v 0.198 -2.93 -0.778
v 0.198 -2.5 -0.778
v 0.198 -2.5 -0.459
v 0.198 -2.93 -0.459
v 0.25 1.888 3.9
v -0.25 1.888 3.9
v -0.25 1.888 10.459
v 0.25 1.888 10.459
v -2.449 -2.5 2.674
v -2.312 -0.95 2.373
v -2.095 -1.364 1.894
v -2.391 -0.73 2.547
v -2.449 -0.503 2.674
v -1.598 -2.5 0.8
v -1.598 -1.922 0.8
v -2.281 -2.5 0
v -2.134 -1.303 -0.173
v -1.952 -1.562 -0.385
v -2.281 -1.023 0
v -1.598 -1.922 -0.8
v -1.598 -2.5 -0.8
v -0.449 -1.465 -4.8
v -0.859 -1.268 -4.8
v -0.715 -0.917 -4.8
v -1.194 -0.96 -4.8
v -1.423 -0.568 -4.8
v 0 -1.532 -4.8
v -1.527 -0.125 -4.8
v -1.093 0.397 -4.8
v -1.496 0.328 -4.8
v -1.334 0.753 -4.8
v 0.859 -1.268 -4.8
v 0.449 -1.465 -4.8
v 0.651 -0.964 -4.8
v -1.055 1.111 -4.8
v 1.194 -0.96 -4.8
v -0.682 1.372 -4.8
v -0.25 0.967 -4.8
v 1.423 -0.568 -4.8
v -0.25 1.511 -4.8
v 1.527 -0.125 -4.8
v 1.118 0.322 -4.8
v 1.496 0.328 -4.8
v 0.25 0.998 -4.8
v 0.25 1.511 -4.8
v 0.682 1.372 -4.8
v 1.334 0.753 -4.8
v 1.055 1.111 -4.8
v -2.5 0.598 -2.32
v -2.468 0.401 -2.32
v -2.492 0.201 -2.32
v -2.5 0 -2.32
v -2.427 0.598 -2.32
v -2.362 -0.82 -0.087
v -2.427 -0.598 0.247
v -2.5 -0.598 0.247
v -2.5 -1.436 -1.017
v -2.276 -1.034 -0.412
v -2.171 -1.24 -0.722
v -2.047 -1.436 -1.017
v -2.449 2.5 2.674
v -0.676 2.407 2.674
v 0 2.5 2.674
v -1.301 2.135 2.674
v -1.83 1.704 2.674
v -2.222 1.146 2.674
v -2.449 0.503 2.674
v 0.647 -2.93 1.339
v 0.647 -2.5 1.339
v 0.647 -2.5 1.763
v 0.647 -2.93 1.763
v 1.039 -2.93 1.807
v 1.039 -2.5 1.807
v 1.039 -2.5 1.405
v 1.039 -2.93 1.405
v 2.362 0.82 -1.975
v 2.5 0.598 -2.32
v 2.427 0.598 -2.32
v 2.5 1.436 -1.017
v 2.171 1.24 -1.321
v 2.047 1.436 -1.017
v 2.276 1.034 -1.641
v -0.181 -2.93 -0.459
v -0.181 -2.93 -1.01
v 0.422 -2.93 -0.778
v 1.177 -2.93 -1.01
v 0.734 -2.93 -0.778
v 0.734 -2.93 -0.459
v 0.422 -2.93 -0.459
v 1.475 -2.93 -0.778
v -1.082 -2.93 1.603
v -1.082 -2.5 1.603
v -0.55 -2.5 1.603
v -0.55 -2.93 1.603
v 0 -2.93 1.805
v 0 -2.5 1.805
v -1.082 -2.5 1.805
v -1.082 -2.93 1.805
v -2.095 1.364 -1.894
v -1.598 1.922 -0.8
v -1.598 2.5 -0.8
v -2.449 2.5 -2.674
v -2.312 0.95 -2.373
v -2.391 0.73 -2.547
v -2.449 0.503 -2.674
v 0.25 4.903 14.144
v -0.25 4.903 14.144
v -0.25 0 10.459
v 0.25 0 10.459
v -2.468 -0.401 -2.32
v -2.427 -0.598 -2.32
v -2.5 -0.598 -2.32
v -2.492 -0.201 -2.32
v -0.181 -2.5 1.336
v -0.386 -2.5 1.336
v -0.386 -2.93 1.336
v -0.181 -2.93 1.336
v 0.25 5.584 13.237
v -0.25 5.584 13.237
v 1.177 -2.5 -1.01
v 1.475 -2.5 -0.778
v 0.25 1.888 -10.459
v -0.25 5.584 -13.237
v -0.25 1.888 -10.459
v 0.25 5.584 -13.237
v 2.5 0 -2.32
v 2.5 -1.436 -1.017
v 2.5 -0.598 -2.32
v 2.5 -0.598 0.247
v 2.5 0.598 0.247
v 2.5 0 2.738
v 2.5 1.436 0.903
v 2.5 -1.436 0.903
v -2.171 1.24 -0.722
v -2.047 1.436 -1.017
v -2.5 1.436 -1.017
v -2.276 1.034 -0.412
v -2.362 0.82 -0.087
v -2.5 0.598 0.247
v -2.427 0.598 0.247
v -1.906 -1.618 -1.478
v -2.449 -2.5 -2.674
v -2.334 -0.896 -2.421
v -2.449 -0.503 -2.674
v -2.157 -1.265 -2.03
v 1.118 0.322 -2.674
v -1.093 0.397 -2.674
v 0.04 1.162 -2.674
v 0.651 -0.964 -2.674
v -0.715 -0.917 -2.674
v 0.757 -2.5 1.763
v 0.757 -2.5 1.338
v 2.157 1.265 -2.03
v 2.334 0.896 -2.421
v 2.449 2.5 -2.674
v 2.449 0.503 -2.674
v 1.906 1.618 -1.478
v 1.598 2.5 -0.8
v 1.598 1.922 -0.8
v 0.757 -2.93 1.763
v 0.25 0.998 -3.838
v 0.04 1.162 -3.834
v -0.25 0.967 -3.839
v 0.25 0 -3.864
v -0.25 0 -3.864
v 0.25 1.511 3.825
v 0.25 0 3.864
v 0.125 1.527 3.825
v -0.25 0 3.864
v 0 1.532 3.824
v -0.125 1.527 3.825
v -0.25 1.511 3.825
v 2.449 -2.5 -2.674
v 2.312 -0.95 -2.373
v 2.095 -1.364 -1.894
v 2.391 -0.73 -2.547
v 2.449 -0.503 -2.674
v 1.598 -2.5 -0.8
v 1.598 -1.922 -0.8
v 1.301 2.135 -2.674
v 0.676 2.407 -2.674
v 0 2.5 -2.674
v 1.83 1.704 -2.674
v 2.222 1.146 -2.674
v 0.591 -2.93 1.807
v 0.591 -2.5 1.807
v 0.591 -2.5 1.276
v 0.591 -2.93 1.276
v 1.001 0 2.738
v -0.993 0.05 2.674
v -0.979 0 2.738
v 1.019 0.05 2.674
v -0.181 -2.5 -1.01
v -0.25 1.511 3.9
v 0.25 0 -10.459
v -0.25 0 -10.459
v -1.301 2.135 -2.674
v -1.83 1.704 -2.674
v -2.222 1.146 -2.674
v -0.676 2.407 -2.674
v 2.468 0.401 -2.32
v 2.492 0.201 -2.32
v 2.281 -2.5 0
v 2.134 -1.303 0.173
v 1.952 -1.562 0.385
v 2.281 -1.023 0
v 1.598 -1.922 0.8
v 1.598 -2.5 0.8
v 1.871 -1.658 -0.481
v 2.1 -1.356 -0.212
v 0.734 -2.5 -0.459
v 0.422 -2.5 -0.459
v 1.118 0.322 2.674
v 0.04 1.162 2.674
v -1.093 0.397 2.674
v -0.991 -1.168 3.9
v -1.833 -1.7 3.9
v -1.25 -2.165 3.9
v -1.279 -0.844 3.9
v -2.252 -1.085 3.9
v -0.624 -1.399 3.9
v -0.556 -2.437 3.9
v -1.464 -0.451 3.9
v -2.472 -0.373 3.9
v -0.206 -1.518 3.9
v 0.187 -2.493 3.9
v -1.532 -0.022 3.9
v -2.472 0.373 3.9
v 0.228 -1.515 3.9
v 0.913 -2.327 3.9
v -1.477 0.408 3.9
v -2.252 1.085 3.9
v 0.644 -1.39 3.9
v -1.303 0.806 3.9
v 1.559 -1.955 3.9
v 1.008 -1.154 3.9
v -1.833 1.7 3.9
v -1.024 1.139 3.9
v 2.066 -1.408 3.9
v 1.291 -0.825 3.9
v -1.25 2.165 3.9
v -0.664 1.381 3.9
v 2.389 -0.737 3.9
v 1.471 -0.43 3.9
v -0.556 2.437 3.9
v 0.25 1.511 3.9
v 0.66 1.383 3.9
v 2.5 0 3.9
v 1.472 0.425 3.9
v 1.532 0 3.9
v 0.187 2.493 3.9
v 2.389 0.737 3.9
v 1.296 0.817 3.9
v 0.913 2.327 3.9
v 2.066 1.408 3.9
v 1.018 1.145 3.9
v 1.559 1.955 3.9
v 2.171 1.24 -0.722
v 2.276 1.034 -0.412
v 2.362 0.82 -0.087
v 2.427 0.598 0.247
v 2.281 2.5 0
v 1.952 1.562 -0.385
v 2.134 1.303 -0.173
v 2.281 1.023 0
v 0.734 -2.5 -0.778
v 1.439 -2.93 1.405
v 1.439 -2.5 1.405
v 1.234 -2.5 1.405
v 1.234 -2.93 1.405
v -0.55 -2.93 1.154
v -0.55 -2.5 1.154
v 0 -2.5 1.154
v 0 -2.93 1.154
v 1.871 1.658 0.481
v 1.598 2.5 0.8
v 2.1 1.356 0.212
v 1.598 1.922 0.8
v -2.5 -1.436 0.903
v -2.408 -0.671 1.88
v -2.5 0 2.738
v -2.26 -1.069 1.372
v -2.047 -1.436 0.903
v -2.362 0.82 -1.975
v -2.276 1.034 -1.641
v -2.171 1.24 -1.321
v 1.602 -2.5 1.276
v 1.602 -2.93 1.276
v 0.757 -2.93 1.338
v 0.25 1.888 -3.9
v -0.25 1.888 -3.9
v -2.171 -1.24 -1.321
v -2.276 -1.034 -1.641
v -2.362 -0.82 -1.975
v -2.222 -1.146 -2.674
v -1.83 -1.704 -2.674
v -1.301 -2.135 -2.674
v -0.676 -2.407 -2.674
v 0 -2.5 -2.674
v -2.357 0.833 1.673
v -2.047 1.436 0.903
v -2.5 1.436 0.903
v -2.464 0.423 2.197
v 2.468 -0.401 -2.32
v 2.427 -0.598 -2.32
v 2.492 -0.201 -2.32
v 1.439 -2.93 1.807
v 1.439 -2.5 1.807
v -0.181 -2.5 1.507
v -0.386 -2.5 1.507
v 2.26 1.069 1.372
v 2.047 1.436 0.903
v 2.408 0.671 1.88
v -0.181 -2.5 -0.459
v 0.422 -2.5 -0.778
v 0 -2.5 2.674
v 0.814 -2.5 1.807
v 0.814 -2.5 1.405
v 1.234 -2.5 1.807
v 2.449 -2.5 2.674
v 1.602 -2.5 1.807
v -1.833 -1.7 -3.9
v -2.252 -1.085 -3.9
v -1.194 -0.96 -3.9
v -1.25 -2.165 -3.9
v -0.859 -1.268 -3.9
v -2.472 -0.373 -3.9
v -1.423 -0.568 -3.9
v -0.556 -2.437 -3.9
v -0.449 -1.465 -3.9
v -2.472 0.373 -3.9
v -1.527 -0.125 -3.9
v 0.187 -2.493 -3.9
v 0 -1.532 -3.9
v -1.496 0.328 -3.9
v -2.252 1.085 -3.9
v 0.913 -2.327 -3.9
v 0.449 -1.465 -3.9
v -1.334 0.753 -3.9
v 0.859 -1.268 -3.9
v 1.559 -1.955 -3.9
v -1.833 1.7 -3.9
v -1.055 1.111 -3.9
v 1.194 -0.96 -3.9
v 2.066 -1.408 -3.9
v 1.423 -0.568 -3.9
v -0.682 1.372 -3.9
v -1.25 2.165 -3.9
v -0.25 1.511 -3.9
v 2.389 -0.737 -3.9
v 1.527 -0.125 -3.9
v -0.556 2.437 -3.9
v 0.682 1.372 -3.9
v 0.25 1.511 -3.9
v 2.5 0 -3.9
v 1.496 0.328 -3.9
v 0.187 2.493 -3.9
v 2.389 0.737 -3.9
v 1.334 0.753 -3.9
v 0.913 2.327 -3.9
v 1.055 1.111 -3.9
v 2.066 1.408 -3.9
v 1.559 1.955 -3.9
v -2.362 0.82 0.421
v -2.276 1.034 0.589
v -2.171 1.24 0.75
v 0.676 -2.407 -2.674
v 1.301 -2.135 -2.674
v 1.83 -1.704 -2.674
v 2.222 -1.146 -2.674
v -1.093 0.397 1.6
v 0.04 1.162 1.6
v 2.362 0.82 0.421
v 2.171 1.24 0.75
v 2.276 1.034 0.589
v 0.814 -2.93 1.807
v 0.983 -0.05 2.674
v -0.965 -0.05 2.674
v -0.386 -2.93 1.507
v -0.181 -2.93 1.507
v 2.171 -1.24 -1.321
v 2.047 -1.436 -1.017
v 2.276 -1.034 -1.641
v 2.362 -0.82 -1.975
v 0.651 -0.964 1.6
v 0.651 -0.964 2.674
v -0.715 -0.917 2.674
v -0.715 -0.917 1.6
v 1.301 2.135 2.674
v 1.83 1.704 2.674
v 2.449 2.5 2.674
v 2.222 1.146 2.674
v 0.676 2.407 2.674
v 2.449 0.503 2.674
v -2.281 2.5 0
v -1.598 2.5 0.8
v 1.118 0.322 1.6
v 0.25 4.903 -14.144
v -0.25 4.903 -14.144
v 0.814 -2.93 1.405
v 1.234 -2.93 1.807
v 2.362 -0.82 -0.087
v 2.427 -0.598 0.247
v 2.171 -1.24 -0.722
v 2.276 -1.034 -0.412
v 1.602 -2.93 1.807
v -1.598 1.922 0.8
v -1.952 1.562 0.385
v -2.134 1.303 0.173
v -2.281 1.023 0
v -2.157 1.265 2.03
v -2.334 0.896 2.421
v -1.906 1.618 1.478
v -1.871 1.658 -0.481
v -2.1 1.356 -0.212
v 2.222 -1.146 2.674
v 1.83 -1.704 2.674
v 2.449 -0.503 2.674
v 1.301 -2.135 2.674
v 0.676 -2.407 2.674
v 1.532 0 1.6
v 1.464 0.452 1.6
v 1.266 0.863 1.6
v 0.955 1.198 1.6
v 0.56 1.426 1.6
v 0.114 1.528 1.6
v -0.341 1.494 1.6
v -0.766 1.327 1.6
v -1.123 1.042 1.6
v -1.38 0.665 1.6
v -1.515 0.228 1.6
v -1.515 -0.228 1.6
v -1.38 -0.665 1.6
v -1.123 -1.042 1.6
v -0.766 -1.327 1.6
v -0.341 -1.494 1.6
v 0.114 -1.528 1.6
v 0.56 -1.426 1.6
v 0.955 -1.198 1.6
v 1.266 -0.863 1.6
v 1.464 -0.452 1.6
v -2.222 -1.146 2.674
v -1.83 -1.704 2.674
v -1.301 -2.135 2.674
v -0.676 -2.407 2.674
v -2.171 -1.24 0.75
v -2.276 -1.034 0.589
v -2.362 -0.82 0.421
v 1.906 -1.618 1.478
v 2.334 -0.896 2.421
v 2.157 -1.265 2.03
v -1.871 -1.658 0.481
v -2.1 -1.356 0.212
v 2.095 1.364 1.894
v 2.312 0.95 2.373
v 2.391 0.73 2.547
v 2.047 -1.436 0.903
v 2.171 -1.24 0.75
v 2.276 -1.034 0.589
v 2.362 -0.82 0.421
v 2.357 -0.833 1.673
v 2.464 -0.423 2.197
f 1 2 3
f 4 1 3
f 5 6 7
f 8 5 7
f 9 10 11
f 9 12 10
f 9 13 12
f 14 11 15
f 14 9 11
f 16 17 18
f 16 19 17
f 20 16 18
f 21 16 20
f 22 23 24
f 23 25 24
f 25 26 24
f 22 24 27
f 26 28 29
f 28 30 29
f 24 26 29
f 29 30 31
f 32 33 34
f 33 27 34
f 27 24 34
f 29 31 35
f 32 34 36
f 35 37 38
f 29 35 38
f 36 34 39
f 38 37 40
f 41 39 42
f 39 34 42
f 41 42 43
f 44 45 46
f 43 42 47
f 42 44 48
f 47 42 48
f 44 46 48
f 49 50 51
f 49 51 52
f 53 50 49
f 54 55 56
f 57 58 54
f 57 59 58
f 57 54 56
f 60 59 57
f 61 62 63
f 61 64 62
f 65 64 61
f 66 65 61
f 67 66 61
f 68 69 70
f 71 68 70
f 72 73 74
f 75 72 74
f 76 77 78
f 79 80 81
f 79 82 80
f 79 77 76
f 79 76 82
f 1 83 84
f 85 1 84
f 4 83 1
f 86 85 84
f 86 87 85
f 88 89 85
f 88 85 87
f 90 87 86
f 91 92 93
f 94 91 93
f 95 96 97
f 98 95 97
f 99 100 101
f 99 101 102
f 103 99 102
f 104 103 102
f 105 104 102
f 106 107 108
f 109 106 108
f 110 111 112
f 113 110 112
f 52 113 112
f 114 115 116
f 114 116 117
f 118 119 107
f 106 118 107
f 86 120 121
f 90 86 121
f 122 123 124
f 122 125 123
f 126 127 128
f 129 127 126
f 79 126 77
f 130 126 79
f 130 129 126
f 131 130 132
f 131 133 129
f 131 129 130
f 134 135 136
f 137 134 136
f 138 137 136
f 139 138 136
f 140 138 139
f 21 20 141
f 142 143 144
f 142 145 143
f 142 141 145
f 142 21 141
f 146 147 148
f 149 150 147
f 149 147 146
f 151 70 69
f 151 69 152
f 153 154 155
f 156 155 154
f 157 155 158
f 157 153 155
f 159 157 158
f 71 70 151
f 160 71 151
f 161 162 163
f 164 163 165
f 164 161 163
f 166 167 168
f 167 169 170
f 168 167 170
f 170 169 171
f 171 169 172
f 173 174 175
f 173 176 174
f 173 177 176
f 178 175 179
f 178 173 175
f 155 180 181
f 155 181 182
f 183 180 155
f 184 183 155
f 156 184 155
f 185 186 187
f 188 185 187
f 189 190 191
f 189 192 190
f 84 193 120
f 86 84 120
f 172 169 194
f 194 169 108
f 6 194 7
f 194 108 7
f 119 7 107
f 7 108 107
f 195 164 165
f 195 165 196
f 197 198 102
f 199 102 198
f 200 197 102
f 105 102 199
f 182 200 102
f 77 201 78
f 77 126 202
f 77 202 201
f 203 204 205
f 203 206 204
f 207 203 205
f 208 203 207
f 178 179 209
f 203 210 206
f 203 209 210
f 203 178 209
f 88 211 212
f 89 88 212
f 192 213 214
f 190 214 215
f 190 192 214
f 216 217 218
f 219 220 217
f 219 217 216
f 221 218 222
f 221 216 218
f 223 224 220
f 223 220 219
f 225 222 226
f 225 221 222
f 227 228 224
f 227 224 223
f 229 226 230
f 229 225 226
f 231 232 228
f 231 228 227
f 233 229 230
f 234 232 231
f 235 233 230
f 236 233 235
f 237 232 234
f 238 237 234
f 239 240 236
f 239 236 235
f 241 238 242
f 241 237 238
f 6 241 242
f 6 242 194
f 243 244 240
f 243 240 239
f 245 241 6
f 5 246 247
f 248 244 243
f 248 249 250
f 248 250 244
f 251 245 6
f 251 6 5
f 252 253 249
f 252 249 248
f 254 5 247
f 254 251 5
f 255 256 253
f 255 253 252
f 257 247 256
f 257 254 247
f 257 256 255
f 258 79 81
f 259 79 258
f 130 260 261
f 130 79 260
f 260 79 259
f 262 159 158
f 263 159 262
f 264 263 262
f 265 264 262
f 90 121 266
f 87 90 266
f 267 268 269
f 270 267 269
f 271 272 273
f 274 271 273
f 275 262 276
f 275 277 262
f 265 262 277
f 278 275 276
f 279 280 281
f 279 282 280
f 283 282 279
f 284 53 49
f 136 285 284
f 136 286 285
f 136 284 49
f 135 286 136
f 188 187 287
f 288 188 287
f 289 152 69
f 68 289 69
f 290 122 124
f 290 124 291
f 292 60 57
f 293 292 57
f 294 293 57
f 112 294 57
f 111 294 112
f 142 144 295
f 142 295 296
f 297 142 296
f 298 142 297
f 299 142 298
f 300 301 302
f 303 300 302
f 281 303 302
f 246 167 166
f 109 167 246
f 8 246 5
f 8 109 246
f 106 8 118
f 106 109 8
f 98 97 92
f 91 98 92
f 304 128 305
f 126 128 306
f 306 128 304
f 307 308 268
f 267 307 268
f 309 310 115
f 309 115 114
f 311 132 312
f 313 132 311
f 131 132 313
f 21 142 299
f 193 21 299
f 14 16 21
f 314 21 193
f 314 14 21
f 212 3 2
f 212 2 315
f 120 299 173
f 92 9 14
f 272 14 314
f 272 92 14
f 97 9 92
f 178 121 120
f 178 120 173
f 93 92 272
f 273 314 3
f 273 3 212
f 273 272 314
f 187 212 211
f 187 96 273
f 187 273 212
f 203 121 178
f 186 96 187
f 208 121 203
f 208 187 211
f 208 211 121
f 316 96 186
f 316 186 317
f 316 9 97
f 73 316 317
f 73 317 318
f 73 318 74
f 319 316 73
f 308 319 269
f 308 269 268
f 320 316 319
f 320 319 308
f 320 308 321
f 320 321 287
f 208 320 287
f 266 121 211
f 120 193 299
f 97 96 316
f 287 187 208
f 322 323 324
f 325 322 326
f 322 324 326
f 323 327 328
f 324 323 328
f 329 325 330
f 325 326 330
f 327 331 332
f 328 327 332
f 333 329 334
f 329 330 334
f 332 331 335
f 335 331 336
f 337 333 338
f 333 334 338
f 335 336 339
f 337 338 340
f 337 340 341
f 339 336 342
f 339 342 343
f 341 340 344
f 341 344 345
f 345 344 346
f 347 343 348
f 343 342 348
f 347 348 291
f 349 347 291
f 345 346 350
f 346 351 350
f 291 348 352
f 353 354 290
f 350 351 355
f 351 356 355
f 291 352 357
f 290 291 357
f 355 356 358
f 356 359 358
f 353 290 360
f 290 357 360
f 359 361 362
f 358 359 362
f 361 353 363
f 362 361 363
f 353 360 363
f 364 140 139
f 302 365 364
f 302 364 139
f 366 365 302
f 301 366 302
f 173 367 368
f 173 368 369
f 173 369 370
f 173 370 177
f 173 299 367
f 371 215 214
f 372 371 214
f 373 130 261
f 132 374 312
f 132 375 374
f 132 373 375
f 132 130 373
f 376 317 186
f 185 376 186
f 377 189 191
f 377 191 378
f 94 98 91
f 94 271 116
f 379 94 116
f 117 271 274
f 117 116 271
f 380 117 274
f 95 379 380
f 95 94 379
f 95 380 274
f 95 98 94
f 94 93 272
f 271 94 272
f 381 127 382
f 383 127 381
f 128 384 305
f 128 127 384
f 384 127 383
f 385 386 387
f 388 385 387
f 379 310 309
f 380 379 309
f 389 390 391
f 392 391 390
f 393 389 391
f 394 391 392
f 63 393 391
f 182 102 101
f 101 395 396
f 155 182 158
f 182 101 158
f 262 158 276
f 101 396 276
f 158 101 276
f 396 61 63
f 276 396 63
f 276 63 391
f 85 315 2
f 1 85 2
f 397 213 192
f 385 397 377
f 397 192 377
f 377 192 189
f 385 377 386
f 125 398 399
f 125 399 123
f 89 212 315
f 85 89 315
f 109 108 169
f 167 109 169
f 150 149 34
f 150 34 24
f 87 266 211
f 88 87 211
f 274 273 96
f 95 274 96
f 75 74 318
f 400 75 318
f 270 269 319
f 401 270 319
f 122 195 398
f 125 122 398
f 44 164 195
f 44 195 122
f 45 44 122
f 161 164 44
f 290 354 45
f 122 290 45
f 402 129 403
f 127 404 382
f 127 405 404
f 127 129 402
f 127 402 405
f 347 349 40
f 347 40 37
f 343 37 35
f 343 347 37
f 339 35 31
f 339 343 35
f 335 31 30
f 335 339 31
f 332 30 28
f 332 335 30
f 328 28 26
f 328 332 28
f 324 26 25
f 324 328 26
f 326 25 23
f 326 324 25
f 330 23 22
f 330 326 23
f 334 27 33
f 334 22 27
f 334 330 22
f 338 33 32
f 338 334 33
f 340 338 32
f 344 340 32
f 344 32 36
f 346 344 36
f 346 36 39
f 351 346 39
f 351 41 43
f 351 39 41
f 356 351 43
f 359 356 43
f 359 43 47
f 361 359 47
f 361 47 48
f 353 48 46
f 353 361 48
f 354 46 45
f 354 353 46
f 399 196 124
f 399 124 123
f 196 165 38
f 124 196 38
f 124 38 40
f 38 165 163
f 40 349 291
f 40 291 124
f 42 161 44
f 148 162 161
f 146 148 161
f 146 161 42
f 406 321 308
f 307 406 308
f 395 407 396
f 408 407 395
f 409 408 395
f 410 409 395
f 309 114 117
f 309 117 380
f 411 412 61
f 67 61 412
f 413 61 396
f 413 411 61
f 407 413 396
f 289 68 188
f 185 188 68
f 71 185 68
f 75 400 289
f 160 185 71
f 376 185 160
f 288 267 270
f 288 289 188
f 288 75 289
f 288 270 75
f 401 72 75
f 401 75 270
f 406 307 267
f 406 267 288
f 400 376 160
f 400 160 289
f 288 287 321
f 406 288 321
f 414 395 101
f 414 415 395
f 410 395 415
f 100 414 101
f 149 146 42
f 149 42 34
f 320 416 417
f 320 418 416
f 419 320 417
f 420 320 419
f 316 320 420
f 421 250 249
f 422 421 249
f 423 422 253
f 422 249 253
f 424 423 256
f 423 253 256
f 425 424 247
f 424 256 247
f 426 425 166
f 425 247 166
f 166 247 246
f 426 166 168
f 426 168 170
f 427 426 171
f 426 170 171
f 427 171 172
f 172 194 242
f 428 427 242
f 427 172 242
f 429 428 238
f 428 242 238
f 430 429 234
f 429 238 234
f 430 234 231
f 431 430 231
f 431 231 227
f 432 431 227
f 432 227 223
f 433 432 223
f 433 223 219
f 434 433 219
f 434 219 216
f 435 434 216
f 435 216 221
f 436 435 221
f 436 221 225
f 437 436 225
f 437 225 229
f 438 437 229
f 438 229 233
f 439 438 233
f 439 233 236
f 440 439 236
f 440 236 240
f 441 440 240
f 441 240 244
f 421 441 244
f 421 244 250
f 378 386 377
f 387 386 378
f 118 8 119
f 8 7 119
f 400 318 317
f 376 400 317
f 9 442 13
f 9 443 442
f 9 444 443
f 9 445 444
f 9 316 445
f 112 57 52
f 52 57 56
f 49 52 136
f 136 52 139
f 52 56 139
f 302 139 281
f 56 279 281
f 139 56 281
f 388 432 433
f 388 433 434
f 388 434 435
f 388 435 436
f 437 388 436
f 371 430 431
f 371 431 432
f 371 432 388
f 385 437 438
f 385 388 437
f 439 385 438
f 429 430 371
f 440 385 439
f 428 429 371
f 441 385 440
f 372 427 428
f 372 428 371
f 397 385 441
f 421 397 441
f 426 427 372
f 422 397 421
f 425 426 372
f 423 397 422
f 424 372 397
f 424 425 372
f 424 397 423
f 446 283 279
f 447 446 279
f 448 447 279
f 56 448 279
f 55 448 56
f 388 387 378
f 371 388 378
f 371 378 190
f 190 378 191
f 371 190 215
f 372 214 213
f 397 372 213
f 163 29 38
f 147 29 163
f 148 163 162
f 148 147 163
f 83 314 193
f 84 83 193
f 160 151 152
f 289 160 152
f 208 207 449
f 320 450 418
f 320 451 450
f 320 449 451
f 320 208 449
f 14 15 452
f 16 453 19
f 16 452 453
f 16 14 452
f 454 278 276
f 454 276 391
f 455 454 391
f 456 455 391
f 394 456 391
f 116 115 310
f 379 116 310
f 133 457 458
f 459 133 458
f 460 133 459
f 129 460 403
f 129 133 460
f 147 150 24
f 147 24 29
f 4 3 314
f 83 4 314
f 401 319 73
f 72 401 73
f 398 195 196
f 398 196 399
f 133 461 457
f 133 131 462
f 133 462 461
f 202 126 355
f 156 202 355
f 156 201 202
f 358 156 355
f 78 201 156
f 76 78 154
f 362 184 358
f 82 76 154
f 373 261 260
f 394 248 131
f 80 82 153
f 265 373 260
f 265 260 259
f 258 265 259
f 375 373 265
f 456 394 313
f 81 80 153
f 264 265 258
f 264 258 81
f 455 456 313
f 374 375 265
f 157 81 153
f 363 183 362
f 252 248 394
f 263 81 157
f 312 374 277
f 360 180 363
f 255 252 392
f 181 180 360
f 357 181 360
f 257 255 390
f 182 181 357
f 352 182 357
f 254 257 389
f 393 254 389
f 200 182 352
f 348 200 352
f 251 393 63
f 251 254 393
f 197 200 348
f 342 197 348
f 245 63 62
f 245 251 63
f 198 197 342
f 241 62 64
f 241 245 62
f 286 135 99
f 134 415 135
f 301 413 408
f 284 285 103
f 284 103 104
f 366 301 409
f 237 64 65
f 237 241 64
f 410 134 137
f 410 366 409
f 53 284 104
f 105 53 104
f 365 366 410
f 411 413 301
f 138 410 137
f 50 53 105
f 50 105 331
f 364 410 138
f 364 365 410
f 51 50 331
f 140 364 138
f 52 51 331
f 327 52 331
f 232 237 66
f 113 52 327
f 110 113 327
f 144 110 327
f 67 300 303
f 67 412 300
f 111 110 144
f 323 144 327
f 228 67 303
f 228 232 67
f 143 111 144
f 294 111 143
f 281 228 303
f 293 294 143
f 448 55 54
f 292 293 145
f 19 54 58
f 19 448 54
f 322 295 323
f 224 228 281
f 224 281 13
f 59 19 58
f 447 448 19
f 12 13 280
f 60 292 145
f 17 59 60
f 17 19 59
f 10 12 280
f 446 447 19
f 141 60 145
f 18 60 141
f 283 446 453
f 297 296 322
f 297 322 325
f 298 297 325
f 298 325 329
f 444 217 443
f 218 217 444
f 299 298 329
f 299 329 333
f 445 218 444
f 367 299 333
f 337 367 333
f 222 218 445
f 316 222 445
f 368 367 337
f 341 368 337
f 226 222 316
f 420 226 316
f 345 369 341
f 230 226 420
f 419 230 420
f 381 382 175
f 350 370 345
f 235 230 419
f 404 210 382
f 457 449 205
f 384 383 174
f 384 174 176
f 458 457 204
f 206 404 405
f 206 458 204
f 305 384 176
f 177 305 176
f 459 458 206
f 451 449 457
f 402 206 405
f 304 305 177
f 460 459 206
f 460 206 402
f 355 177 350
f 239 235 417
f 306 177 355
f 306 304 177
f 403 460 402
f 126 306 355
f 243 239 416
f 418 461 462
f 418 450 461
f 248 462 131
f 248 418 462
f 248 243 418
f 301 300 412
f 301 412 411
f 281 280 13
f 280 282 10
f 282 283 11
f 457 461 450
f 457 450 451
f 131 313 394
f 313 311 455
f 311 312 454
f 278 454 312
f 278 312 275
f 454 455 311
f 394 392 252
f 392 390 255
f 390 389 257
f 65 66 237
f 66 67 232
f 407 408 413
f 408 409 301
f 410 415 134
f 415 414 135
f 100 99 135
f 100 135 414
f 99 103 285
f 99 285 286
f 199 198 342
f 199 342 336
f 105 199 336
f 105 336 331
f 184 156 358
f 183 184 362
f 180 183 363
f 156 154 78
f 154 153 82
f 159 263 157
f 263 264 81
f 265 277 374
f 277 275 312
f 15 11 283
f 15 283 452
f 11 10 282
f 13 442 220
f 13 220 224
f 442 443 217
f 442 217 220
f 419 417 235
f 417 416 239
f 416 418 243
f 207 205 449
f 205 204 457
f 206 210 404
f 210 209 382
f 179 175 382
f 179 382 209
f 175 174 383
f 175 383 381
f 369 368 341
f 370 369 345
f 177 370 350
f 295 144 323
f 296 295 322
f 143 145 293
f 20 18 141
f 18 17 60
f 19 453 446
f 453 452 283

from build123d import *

# Parameters (mm, degrees)
F0_R      = 1.5320214601
F1_DEPTH  = 4.8
F0_R_2    = 2.5
F2_DEPTH  = 3.9
F4_DEPTH  = 2.5
F6_DEPTH  = 2.5
F7_DEPTH  = 3.2
F8_W      = 0.2057314705
F8_H      = 0.1714428654
F9_DEPTH  = 0.4
F11_DEPTH = 0.25
F12_DEPTH = 0.43


with BuildPart() as f1:
    # F0 (on Top) → F1 (new body, symmetric)
    with BuildSketch(Plane.XY):
        Circle(F0_R)
        Polygon((0.039557572, 1.1622756139), (1.1176137583, 0.3215414302), (0.6511657169, -0.9635520812), (-0.715171213, -0.9170493663), (-1.0931658343, 0.3967844035), align=None, mode=Mode.SUBTRACT)
    extrude(amount=F1_DEPTH, both=True)

    # F0 (on Top) → F2 (join, symmetric)
    with BuildSketch(Plane.XY):
        Circle(F0_R_2)
        Circle(F0_R, mode=Mode.SUBTRACT)
    extrude(amount=F2_DEPTH, both=True)

    # F3 (on Front) → F4 (join, symmetric)
    with BuildSketch(Plane.XZ):
        Polygon((2.4489383213, 2.6739891618), (0, 2.6739891618), (1.5983604826, 0.8004051051), align=None)
        Polygon((-1.5983604826, 0.8004051051), (0, 2.6739891618), (-2.4489383213, 2.6739891618), align=None)
        Polygon((0, 0), (0, 2.6739891618), (-1.5983604826, 0.8004051051), (-1.5983604826, 0), align=None)
        Polygon((1.5983604826, 0.8004051051), (0, 2.6739891618), (0, 0), (1.5983604826, 0), align=None)
        Polygon((2.2811886085, 0), (1.5983604826, 0.8004051051), (1.5983604826, 0), (1.5983604826, -0.8004051051), align=None)
        Polygon((-1.5983604826, 0), (-1.5983604826, 0.8004051051), (-2.2811886085, 0), (-1.5983604826, -0.8004051051), align=None)
        Polygon((0, -2.6739891618), (0, 0), (-1.5983604826, 0), (-1.5983604826, -0.8004051051), align=None)
        Polygon((1.5983604826, 0), (0, 0), (0, -2.6739891618), (1.5983604826, -0.8004051051), align=None)
        Polygon((1.5983604826, -0.8004051051), (0, -2.6739891618), (2.4489383213, -2.6739891618), align=None)
        Polygon((-2.4489383213, -2.6739891618), (0, -2.6739891618), (-1.5983604826, -0.8004051051), align=None)
    extrude(amount=F4_DEPTH, both=True)

    # F5 (on Right) → F6 (join, symmetric)
    with BuildSketch(Plane.YZ):
        Polygon((1.4358381741, 0.9031511727), (0, 2.7375903446), (-1.4358381741, 0.9031511727), (-0.5977854705, 0.2471969813), (-1.4358381741, -1.0170094902), (-0.5977854705, -2.3199757561), (0.5977854705, -2.3199757561), (1.4358381741, -1.0170094902), (0.5977854705, 0.2471969813), align=None)
    extrude(amount=F6_DEPTH, both=True)

    # F7 (cut): a face of the model
    f7_faces = [f1.faces().sort_by_distance(p)[0] for p in [
        (-1.4886893496, 0, 4.8),
    ]]
    extrude(f7_faces, amount=-F7_DEPTH, mode=Mode.SUBTRACT)

    # F8 (on face) → F9 (join)
    with BuildSketch(Plane.XZ.offset(2.5)):
        Polygon((-0.181210431, -0.4586814321), (-0.181210431, -1.0104251851), (1.1774745134, -1.0104251851), (1.4746332308, -0.7784541231), (1.1832588352, -0.7784541231), (0.7335068658, -0.7784541231), (0.7335068658, -0.4586814321), (0.4220934934, -0.4586814321), (0.4220934934, -0.7784541231), (0.1979402587, -0.7784541231), (0.1979402587, -0.4586814321), align=None)
        Polygon((0, 1.6032253625), (0, 1.8050573999), (-1.0815345449, 1.8050573999), (-1.0815345449, 1.6032253625), (-0.5499689287, 1.6032253625), (-0.5499689287, 1.1543665896), (0, 1.1543665896), align=None)
        with Locations((-0.2835566193, 1.4216544223)):
            Rectangle(F8_W, F8_H, mode=Mode.SUBTRACT)
        Polygon((0.5908022868, 1.8074008403), (0.5908022868, 1.2759278761), (1.2337132357, 1.2759278761), (1.6023155767, 1.2759278761), (1.6023155767, 1.7541147536), (1.5667511437, 1.7541147536), (1.529708039, 1.7541147536), (1.529708039, 1.3383656042), (1.1996804969, 1.3380937204), (1.0839564493, 1.3379983845), (1.0839564493, 1.8074008403), (1.0386969661, 1.8074008403), (1.0386969661, 1.4045101125), (0.8136780816, 1.4045101125), (0.8136780816, 1.8074008403), align=None)
        Polygon((0.7572061731, 1.7627113266), (0.7572061731, 1.3381995394), (0.6472741952, 1.3391206739), (0.6472741952, 1.7627113266), align=None, mode=Mode.SUBTRACT)
        Polygon((1.5667511437, 1.7541147536), (1.6023155767, 1.7541147536), (1.6023155767, 1.8074008403), (1.4394447207, 1.8074008403), (1.4394447207, 1.7541147536), (1.529708039, 1.7541147536), align=None)
        Polygon((1.529708039, 1.3383656042), (1.529708039, 1.7541147536), (1.4394447207, 1.7541147536), (1.4394447207, 1.4045101125), (1.2337132357, 1.4045101125), (1.2337132357, 1.8074008403), (1.1996804969, 1.8074008403), (1.1996804969, 1.3380937204), align=None)
        Polygon((1.1996804969, 1.8074008403), (1.0839564493, 1.8074008403), (1.0839564493, 1.3379983845), (1.1996804969, 1.3380937204), align=None)
    extrude(amount=F9_DEPTH)

    # F10 (on Right) → F11 (join, symmetric)
    with BuildSketch(Plane.YZ):
        Polygon((0, 10.4586472735), (0, 3.8638201077), (1.8880540525, 3.8153284695), (1.8880540525, 10.4586472735), (5.5842293836, 13.2371469554), (4.9025323242, 14.1439931467), align=None)
        Polygon((1.8880540525, -3.8153284695), (0, -3.8638201077), (0, -10.4586472735), (4.9025323242, -14.1439931467), (5.5842293836, -13.2371469554), (1.8880540525, -10.4586472735), align=None)
    extrude(amount=F11_DEPTH, both=True)

    # F8 (on face) → F12 (join)
    with BuildSketch(Plane.XZ.offset(2.5)):
        Polygon((-0.181210431, -0.4586814321), (-0.181210431, -1.0104251851), (1.1774745134, -1.0104251851), (1.4746332308, -0.7784541231), (1.1832588352, -0.7784541231), (0.7335068658, -0.7784541231), (0.7335068658, -0.4586814321), (0.4220934934, -0.4586814321), (0.4220934934, -0.7784541231), (0.1979402587, -0.7784541231), (0.1979402587, -0.4586814321), align=None)
        Polygon((0, 1.6032253625), (0, 1.8050573999), (-1.0815345449, 1.8050573999), (-1.0815345449, 1.6032253625), (-0.5499689287, 1.6032253625), (-0.5499689287, 1.1543665896), (0, 1.1543665896), align=None)
        with Locations((-0.2835566193, 1.4216544223)):
            Rectangle(F8_W, F8_H, mode=Mode.SUBTRACT)
        Polygon((0.5908022868, 1.8074008403), (0.5908022868, 1.2759278761), (1.2337132357, 1.2759278761), (1.6023155767, 1.2759278761), (1.6023155767, 1.7541147536), (1.5667511437, 1.7541147536), (1.529708039, 1.7541147536), (1.529708039, 1.3383656042), (1.1996804969, 1.3380937204), (1.0839564493, 1.3379983845), (1.0839564493, 1.8074008403), (1.0386969661, 1.8074008403), (1.0386969661, 1.4045101125), (0.8136780816, 1.4045101125), (0.8136780816, 1.8074008403), align=None)
        Polygon((0.7572061731, 1.7627113266), (0.7572061731, 1.3381995394), (0.6472741952, 1.3391206739), (0.6472741952, 1.7627113266), align=None, mode=Mode.SUBTRACT)
        Polygon((1.5667511437, 1.7541147536), (1.6023155767, 1.7541147536), (1.6023155767, 1.8074008403), (1.4394447207, 1.8074008403), (1.4394447207, 1.7541147536), (1.529708039, 1.7541147536), align=None)
        Polygon((1.529708039, 1.3383656042), (1.529708039, 1.7541147536), (1.4394447207, 1.7541147536), (1.4394447207, 1.4045101125), (1.2337132357, 1.4045101125), (1.2337132357, 1.8074008403), (1.1996804969, 1.8074008403), (1.1996804969, 1.3380937204), align=None)
        Polygon((1.1996804969, 1.8074008403), (1.0839564493, 1.8074008403), (1.0839564493, 1.3379983845), (1.1996804969, 1.3380937204), align=None)
    extrude(amount=F12_DEPTH)


solid = f1.part
